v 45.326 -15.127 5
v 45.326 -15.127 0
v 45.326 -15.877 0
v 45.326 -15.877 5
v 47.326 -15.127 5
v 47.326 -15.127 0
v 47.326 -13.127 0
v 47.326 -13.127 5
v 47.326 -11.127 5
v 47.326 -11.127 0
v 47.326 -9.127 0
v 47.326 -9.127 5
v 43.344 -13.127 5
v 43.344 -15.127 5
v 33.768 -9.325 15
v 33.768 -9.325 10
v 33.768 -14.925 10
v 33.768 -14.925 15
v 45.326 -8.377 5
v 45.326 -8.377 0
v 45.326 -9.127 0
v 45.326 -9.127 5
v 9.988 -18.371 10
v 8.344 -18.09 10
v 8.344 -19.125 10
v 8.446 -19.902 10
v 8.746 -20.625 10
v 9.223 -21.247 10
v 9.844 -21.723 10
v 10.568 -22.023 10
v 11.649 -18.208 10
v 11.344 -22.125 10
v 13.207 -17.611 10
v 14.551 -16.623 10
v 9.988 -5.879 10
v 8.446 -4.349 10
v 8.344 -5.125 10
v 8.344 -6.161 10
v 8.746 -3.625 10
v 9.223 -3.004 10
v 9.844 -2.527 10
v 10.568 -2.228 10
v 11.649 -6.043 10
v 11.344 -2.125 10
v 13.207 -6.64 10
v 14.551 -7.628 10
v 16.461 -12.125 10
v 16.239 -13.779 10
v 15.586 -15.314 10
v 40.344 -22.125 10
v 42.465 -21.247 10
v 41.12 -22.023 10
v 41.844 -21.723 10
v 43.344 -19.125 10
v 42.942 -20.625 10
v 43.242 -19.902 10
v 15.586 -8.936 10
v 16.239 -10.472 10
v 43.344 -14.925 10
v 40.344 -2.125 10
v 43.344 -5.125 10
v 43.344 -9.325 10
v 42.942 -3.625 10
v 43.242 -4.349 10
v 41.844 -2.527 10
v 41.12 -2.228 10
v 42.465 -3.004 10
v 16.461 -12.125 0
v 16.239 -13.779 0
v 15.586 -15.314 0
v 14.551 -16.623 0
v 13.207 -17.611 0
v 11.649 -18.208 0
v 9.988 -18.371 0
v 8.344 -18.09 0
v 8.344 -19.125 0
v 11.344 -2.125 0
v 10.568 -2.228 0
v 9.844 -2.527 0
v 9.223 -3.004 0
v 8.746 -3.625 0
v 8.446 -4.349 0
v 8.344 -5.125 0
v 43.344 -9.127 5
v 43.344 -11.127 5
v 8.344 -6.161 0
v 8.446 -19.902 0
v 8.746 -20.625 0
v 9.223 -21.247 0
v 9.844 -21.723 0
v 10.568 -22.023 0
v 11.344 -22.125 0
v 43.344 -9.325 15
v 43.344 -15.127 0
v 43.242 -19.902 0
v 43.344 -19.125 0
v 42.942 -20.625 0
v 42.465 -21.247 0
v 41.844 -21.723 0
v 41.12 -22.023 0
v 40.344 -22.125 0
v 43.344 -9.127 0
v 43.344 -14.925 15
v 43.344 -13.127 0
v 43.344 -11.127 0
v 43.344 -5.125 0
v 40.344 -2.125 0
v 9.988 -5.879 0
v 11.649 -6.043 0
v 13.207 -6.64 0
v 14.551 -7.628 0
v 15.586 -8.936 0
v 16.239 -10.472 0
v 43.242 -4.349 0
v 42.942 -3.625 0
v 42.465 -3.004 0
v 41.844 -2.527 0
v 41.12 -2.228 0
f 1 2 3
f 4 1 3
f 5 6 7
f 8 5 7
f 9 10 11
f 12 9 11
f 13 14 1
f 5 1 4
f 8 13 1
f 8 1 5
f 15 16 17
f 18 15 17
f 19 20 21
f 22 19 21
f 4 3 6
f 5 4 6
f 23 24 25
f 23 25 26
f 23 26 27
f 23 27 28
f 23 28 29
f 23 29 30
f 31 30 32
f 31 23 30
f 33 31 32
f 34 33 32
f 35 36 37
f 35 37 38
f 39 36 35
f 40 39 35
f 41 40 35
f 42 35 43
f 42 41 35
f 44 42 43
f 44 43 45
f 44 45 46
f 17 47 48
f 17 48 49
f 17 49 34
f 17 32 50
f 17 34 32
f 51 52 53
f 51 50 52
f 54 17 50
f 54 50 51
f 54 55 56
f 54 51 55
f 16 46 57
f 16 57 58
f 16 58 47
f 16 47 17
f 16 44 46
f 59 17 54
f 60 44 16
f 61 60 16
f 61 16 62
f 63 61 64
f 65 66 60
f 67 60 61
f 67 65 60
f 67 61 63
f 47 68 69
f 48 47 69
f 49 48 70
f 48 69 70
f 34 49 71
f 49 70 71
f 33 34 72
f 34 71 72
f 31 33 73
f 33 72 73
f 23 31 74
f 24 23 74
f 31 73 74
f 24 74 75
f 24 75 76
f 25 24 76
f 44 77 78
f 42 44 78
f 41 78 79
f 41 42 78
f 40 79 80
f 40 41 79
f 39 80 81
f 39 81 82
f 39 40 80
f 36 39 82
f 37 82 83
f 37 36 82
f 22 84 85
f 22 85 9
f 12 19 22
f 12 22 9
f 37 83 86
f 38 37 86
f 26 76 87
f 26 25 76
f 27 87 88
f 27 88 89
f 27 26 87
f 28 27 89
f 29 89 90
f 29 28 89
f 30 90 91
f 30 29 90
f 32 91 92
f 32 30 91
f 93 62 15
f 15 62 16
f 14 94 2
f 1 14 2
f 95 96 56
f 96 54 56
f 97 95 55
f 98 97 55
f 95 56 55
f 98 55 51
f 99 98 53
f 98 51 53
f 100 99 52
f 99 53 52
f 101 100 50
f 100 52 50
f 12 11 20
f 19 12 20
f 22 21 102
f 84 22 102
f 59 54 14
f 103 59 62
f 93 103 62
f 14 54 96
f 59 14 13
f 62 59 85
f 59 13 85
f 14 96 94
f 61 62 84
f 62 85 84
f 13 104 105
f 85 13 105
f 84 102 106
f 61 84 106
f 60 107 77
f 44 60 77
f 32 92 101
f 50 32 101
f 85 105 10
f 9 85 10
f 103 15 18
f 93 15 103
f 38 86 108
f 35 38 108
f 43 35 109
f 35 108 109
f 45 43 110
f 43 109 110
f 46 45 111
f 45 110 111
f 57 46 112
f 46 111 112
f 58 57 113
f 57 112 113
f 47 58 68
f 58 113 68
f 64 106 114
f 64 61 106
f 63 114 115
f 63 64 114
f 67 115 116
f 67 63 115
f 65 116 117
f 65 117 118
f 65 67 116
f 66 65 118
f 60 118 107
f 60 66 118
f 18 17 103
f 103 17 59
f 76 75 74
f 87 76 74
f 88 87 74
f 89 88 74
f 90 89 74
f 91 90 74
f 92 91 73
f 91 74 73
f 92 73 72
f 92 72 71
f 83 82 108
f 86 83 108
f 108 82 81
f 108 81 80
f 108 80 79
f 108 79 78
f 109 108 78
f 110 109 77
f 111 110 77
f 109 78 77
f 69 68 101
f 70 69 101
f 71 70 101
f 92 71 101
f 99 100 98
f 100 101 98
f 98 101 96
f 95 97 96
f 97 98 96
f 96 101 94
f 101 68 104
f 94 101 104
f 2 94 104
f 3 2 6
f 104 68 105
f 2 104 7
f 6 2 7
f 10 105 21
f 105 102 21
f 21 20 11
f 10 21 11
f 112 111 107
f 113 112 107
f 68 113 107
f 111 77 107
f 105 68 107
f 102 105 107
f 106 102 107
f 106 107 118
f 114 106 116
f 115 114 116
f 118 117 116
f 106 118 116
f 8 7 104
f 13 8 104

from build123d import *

# Parameters (mm, degrees)
F1_DEPTH = 10
F2_DEPTH = 15
F3_R     = 3
F0_W     = 2
F0_H     = 2
F4_DEPTH = 5


with BuildPart() as f1:
    # F0 (on Top) → F1 (new body)
    with BuildSketch(Plane.XY):
        with BuildLine():
            Line((43.3439803123, -2.1253142133), (8.3439803123, -2.1253142133))
            Line((8.3439803123, -2.1253142133), (8.3439803123, -6.1607846163))
            ThreePointArc((8.3439803123, -6.1607846163), (13.9120945643, -7.088784926), (16.4613010362, -12.1253142133))
            ThreePointArc((16.4613010362, -12.1253142133), (13.9120945643, -17.1618435006), (8.3439803123, -18.0898438104))
            Line((8.3439803123, -18.0898438104), (8.3439803123, -22.1253142133))
            Line((8.3439803123, -22.1253142133), (43.3439803123, -22.1253142133))
            Line((43.3439803123, -22.1253142133), (43.3439803123, -15.1270665228))
            Line((43.3439803123, -15.1270665228), (43.3439803123, -14.9253142133))
            Line((43.3439803123, -14.9253142133), (33.7679572403, -14.9253142133))
            Line((33.7679572403, -14.9253142133), (33.7679572403, -9.3253142133))
            Line((33.7679572403, -9.3253142133), (43.3439803123, -9.3253142133))
            Line((43.3439803123, -9.3253142133), (43.3439803123, -9.1270665228))
            Line((43.3439803123, -9.1270665228), (43.3439803123, -2.1253142133))
        make_face()
        Polygon((43.3439803123, -11.1270665228), (43.3439803123, -9.3253142133), (33.7679572403, -9.3253142133), (33.7679572403, -14.9253142133), (43.3439803123, -14.9253142133), (43.3439803123, -13.1270665228), align=None)
    extrude(amount=F1_DEPTH)

    # F0 (on Top) → F2 (join)
    with BuildSketch(Plane.XY):
        Polygon((43.3439803123, -11.1270665228), (43.3439803123, -9.3253142133), (33.7679572403, -9.3253142133), (33.7679572403, -14.9253142133), (43.3439803123, -14.9253142133), (43.3439803123, -13.1270665228), align=None)
    extrude(amount=F2_DEPTH)

    # F3
    f3_edges = [f1.edges().sort_by_distance(p)[0] for p in [
        (8.34398, -22.125314, 5),
        (43.34398, -22.125314, 5),
        (43.34398, -2.125314, 5),
        (8.34398, -2.125314, 5),
    ]]
    fillet(f3_edges, radius=F3_R)

    # F0 (on Top) → F4 (join)
    with BuildSketch(Plane.XY):
        Polygon((45.3259829879, -9.1270665228), (43.3439803123, -9.1270665228), (43.3439803123, -9.3253142133), (43.3439803123, -11.1270665228), (44.0259829879, -11.1270665228), (45.3259829879, -11.1270665228), align=None)
        with Locations((46.3259829879, -10.1270665228)):
            Rectangle(F0_W, F0_H)
        Polygon((45.3259829879, -8.3770665228), (45.3259829879, -9.1270665228), (47.3259829879, -9.1270665228), align=None)
        with Locations((46.3259829879, -14.1270665228)):
            Rectangle(F0_W, F0_H)
        Polygon((47.3259829879, -15.1270665228), (45.3259829879, -15.1270665228), (45.3259829879, -15.8770665228), align=None)
        Polygon((44.0259829879, -13.1270665228), (43.3439803123, -13.1270665228), (43.3439803123, -14.9253142133), (43.3439803123, -15.1270665228), (45.3259829879, -15.1270665228), (45.3259829879, -13.1270665228), align=None)
    extrude(amount=F4_DEPTH)


solid = f1.part
